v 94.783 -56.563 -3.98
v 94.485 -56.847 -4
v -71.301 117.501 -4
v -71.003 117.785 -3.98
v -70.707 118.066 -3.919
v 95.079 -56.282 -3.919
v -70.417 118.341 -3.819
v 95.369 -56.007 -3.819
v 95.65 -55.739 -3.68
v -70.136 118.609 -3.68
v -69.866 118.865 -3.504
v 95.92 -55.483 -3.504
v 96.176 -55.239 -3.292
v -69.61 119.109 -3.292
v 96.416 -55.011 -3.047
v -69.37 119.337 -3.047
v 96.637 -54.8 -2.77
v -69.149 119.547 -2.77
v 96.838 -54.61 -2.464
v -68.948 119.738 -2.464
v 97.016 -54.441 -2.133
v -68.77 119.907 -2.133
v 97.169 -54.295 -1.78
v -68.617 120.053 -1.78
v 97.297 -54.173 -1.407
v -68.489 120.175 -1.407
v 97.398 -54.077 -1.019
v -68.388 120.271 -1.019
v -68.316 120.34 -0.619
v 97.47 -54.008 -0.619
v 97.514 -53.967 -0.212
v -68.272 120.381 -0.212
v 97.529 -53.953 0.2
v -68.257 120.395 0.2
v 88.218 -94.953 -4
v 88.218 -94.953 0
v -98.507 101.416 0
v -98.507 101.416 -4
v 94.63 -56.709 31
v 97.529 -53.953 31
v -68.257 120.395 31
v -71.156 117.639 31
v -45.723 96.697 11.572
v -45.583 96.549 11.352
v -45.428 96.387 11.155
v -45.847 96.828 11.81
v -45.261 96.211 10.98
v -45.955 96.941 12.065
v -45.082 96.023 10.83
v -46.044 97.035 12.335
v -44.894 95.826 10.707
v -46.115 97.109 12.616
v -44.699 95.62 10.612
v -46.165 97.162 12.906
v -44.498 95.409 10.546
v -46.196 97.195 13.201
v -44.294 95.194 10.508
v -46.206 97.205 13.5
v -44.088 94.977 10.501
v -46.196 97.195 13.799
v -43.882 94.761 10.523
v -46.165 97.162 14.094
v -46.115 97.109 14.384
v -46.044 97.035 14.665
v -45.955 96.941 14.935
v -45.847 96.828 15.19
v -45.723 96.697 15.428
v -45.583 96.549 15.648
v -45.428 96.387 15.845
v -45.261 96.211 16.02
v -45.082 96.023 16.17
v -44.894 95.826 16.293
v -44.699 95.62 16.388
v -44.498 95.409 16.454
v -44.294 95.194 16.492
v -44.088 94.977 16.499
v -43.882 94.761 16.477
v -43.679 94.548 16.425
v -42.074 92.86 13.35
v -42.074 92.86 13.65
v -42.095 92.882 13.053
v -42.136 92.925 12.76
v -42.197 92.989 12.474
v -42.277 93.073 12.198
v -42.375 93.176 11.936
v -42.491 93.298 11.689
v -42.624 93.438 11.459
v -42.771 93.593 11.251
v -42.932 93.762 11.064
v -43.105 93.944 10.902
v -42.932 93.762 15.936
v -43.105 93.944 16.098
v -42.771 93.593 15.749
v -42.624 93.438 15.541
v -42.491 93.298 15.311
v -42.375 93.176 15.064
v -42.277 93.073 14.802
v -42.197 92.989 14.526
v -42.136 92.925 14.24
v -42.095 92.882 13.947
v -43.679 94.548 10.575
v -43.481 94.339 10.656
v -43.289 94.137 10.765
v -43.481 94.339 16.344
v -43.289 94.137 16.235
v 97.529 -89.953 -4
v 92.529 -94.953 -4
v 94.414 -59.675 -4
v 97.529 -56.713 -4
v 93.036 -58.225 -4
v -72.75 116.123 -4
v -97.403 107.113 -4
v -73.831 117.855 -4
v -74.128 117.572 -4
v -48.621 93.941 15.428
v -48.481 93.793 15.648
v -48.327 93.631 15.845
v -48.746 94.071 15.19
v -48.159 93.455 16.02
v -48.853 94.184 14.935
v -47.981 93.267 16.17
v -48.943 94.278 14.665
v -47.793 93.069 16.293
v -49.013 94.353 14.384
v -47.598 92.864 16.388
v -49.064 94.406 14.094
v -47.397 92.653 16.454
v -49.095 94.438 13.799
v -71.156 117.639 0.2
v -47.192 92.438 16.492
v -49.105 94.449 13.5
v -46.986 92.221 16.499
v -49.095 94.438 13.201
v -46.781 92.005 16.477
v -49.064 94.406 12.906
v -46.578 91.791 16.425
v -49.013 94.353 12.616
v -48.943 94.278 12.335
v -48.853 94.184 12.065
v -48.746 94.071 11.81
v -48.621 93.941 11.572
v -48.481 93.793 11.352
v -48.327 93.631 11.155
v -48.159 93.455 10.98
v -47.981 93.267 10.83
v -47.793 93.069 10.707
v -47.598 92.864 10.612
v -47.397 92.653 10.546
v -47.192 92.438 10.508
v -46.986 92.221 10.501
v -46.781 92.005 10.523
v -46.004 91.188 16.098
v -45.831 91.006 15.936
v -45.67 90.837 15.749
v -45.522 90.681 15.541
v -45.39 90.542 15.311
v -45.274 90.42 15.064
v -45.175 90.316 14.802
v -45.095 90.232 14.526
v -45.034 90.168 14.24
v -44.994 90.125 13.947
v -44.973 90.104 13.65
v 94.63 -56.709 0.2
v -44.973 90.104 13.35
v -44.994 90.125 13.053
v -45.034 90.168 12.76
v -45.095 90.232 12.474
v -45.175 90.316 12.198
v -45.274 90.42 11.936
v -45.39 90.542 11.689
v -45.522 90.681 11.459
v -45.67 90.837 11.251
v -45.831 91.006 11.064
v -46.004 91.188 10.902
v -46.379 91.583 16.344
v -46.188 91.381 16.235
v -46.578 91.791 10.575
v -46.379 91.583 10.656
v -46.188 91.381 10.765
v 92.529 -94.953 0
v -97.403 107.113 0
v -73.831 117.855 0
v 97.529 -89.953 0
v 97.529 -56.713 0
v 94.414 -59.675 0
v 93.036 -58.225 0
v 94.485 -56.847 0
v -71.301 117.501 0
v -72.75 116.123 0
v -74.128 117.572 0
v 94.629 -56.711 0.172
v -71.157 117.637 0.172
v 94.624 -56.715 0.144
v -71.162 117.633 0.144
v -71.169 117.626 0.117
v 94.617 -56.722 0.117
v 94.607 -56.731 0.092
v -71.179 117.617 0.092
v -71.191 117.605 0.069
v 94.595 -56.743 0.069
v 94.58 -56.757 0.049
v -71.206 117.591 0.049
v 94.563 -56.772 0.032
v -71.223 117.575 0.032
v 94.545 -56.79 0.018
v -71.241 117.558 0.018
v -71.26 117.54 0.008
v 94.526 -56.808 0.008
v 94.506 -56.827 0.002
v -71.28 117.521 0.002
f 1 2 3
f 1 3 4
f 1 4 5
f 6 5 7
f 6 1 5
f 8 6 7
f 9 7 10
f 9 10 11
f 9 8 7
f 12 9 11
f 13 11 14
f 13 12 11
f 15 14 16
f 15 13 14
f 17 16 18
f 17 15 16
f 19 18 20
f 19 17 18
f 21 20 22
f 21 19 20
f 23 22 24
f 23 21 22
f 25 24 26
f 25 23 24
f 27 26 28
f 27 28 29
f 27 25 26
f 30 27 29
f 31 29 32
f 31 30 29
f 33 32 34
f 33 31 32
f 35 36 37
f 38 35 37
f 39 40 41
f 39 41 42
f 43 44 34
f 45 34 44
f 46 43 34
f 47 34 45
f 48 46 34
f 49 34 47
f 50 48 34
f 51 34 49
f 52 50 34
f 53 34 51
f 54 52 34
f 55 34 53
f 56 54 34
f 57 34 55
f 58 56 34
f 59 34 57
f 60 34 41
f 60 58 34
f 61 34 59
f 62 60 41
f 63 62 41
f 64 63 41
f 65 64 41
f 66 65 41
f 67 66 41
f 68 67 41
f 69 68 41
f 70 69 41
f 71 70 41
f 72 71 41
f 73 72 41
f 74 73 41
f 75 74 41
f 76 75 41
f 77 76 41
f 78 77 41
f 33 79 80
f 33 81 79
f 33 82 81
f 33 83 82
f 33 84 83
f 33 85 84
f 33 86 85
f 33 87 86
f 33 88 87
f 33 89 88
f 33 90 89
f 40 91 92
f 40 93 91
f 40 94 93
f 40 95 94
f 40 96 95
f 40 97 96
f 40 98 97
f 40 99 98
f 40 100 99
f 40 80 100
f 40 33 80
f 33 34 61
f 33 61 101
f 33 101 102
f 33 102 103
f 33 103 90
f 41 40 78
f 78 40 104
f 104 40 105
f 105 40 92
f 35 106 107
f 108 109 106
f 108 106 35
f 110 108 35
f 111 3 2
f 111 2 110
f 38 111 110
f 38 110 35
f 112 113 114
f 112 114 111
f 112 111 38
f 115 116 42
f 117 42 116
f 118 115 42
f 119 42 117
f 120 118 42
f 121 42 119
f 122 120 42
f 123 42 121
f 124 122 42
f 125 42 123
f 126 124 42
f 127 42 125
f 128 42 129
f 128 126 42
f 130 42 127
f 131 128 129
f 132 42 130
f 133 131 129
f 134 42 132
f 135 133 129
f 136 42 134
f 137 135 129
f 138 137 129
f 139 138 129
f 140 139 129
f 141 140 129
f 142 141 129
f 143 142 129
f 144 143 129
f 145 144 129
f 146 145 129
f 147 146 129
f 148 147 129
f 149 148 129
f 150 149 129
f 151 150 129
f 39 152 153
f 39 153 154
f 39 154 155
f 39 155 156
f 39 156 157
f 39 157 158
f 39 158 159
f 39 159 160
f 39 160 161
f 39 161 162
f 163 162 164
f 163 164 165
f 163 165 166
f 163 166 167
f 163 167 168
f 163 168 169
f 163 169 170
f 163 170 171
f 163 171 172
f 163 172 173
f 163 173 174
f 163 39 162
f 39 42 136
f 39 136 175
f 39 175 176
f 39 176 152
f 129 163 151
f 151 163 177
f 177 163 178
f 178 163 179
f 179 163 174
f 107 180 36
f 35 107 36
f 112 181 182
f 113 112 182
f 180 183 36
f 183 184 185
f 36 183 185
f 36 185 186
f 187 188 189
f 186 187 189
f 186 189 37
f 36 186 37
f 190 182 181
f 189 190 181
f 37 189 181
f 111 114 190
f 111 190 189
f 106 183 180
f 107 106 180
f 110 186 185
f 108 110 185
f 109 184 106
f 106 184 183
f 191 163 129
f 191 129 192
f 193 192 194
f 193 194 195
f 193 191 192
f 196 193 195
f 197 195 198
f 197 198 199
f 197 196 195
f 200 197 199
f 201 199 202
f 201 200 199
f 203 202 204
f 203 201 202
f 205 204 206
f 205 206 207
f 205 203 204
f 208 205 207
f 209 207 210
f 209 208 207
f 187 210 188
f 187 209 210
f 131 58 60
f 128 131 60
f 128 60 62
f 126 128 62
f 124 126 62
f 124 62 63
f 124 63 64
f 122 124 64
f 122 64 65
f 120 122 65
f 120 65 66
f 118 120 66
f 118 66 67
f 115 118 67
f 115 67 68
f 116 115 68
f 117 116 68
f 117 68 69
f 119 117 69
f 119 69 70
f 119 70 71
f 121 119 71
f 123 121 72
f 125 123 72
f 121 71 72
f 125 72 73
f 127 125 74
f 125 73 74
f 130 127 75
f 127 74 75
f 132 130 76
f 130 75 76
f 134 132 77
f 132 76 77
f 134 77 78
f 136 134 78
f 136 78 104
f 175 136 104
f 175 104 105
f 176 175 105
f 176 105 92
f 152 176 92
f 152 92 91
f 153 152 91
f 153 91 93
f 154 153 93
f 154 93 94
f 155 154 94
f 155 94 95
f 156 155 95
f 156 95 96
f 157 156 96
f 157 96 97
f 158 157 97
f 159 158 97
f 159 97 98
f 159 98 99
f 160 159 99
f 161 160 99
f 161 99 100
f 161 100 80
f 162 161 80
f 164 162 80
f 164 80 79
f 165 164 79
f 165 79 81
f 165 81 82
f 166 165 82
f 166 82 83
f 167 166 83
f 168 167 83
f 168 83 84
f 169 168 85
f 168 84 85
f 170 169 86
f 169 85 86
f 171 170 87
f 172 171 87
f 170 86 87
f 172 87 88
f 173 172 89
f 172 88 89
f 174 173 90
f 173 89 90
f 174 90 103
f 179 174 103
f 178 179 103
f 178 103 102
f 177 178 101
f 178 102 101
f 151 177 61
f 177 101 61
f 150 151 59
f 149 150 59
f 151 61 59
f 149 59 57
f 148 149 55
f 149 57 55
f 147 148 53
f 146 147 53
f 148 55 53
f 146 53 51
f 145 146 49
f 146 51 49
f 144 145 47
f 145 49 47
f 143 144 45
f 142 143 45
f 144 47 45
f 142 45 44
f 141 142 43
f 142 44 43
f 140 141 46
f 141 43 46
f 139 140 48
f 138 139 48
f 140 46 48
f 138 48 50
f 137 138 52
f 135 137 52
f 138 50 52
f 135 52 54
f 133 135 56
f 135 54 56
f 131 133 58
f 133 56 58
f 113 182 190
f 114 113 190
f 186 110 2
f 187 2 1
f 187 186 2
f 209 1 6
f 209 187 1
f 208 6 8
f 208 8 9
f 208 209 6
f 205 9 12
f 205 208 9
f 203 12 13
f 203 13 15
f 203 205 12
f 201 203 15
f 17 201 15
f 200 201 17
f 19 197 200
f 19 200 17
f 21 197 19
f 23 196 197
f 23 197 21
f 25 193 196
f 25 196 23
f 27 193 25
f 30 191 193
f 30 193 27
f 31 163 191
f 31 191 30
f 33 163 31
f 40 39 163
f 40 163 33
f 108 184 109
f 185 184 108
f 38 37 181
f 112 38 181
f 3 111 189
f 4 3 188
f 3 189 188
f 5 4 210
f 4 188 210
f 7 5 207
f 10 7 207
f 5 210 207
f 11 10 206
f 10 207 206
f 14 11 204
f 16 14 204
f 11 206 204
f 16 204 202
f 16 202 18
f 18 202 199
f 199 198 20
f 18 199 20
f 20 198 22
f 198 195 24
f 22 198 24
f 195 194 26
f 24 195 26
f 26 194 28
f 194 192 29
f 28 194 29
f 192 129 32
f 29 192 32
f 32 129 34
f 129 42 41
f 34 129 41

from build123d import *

# Parameters (mm, degrees)
BASE_FLANGE1_DEPTH            = 4
EDGE_FLANGE1_STRIP_W          = 16.4
EDGE_FLANGE1_STRIP_H          = 4
EDGE_FLANGE1_STRIP_CUT_DEPTH  = 240.587208925
EDGE_FLANGE1_RELIEF_W         = 18.4
EDGE_FLANGE1_RELIEF_H         = 2
EDGE_FLANGE1_RELIEF_CUT_DEPTH = 4
EDGE_FLANGE1_DEPTH            = 240.587208925
SKETCH9_R                     = 3
CUT_EXTRUDE1_DEPTH            = 10


# Sheet-metal steps are written as plain solids
with BuildPart() as part:
    # Sketch1 → Base-Flange1 (new body)
    with BuildSketch(Plane.XY):
        Polygon((88.217940857, -94.952805993), (-98.507333634, 101.415804733), (-97.402972414, 107.112654424), (-68.257223266, 120.395137548), (97.52878242, -53.952805993), (97.52878242, -89.952805993), (92.52878242, -94.952805993), align=None)
    extrude(amount=-BASE_FLANGE1_DEPTH)

    # Edge-Flange1 strip (across the edge) → Edge-Flange1 strip cut (cut)
    with BuildSketch(Plane(origin=(97.52878242, -53.952805993, 0), x_dir=(-0.7246766954889595, -0.689089026915392, 3.4914813388431334e-15), z_dir=(-0.689089026915392, 0.7246766954889595, 0))):
        with Locations((-4, -2)):
            Rectangle(EDGE_FLANGE1_STRIP_W, EDGE_FLANGE1_STRIP_H)
    extrude(amount=EDGE_FLANGE1_STRIP_CUT_DEPTH, mode=Mode.SUBTRACT)

    # Edge-Flange1 relief (on the sheet) → Edge-Flange1 relief cut (cut)
    with BuildSketch(Plane(origin=(94.485140299, -56.846979906, 0), x_dir=(-0.7246766954889595, -0.689089026915392, 6.982962677686267e-15), z_dir=(0, 0, 1))):
        with Locations((-7.2, 1)):
            Rectangle(EDGE_FLANGE1_RELIEF_W, EDGE_FLANGE1_RELIEF_H)
        with Locations((-7.2, -241.587208925)):
            Rectangle(EDGE_FLANGE1_RELIEF_W, EDGE_FLANGE1_RELIEF_H)
    extrude(amount=-EDGE_FLANGE1_RELIEF_CUT_DEPTH, mode=Mode.SUBTRACT)

    # Edge-Flange1 section (across the edge) → Edge-Flange1 (add)
    with BuildSketch(Plane(origin=(97.52878242, -53.952805993, 0), x_dir=(-0.7246766954889595, -0.689089026915392, 3.4914813388431334e-15), z_dir=(-0.689089026915392, 0.7246766954889595, 0))):
        with BuildLine():
            Line((0, 0.2), (0, 31))
            Line((0, 31), (4, 31))
            Line((4, 31), (4, 0.2))
            ThreePointArc((4, 0.2), (4.058578644, 0.058578644), (4.2, 0))
            Line((4.2, 0), (4.2, -4))
            ThreePointArc((4.2, -4), (1.230151519, -2.769848481), (0, 0.2))
        make_face()
    extrude(amount=EDGE_FLANGE1_DEPTH)

    # Sketch9 → Cut-Extrude1 (cut)
    with BuildSketch(Plane(origin=(24.275617922, 23.083482656, 0), x_dir=(0, 0, -1), z_dir=(0.7246766954889596, 0.689089026915392, -3.4889229979583694e-15))):
        with Locations(Location((-13.5, 99.282853991, 0), (0, 0, 90))):
            Circle(SKETCH9_R)
    extrude(amount=-CUT_EXTRUDE1_DEPTH, mode=Mode.SUBTRACT)


solid = part.part
